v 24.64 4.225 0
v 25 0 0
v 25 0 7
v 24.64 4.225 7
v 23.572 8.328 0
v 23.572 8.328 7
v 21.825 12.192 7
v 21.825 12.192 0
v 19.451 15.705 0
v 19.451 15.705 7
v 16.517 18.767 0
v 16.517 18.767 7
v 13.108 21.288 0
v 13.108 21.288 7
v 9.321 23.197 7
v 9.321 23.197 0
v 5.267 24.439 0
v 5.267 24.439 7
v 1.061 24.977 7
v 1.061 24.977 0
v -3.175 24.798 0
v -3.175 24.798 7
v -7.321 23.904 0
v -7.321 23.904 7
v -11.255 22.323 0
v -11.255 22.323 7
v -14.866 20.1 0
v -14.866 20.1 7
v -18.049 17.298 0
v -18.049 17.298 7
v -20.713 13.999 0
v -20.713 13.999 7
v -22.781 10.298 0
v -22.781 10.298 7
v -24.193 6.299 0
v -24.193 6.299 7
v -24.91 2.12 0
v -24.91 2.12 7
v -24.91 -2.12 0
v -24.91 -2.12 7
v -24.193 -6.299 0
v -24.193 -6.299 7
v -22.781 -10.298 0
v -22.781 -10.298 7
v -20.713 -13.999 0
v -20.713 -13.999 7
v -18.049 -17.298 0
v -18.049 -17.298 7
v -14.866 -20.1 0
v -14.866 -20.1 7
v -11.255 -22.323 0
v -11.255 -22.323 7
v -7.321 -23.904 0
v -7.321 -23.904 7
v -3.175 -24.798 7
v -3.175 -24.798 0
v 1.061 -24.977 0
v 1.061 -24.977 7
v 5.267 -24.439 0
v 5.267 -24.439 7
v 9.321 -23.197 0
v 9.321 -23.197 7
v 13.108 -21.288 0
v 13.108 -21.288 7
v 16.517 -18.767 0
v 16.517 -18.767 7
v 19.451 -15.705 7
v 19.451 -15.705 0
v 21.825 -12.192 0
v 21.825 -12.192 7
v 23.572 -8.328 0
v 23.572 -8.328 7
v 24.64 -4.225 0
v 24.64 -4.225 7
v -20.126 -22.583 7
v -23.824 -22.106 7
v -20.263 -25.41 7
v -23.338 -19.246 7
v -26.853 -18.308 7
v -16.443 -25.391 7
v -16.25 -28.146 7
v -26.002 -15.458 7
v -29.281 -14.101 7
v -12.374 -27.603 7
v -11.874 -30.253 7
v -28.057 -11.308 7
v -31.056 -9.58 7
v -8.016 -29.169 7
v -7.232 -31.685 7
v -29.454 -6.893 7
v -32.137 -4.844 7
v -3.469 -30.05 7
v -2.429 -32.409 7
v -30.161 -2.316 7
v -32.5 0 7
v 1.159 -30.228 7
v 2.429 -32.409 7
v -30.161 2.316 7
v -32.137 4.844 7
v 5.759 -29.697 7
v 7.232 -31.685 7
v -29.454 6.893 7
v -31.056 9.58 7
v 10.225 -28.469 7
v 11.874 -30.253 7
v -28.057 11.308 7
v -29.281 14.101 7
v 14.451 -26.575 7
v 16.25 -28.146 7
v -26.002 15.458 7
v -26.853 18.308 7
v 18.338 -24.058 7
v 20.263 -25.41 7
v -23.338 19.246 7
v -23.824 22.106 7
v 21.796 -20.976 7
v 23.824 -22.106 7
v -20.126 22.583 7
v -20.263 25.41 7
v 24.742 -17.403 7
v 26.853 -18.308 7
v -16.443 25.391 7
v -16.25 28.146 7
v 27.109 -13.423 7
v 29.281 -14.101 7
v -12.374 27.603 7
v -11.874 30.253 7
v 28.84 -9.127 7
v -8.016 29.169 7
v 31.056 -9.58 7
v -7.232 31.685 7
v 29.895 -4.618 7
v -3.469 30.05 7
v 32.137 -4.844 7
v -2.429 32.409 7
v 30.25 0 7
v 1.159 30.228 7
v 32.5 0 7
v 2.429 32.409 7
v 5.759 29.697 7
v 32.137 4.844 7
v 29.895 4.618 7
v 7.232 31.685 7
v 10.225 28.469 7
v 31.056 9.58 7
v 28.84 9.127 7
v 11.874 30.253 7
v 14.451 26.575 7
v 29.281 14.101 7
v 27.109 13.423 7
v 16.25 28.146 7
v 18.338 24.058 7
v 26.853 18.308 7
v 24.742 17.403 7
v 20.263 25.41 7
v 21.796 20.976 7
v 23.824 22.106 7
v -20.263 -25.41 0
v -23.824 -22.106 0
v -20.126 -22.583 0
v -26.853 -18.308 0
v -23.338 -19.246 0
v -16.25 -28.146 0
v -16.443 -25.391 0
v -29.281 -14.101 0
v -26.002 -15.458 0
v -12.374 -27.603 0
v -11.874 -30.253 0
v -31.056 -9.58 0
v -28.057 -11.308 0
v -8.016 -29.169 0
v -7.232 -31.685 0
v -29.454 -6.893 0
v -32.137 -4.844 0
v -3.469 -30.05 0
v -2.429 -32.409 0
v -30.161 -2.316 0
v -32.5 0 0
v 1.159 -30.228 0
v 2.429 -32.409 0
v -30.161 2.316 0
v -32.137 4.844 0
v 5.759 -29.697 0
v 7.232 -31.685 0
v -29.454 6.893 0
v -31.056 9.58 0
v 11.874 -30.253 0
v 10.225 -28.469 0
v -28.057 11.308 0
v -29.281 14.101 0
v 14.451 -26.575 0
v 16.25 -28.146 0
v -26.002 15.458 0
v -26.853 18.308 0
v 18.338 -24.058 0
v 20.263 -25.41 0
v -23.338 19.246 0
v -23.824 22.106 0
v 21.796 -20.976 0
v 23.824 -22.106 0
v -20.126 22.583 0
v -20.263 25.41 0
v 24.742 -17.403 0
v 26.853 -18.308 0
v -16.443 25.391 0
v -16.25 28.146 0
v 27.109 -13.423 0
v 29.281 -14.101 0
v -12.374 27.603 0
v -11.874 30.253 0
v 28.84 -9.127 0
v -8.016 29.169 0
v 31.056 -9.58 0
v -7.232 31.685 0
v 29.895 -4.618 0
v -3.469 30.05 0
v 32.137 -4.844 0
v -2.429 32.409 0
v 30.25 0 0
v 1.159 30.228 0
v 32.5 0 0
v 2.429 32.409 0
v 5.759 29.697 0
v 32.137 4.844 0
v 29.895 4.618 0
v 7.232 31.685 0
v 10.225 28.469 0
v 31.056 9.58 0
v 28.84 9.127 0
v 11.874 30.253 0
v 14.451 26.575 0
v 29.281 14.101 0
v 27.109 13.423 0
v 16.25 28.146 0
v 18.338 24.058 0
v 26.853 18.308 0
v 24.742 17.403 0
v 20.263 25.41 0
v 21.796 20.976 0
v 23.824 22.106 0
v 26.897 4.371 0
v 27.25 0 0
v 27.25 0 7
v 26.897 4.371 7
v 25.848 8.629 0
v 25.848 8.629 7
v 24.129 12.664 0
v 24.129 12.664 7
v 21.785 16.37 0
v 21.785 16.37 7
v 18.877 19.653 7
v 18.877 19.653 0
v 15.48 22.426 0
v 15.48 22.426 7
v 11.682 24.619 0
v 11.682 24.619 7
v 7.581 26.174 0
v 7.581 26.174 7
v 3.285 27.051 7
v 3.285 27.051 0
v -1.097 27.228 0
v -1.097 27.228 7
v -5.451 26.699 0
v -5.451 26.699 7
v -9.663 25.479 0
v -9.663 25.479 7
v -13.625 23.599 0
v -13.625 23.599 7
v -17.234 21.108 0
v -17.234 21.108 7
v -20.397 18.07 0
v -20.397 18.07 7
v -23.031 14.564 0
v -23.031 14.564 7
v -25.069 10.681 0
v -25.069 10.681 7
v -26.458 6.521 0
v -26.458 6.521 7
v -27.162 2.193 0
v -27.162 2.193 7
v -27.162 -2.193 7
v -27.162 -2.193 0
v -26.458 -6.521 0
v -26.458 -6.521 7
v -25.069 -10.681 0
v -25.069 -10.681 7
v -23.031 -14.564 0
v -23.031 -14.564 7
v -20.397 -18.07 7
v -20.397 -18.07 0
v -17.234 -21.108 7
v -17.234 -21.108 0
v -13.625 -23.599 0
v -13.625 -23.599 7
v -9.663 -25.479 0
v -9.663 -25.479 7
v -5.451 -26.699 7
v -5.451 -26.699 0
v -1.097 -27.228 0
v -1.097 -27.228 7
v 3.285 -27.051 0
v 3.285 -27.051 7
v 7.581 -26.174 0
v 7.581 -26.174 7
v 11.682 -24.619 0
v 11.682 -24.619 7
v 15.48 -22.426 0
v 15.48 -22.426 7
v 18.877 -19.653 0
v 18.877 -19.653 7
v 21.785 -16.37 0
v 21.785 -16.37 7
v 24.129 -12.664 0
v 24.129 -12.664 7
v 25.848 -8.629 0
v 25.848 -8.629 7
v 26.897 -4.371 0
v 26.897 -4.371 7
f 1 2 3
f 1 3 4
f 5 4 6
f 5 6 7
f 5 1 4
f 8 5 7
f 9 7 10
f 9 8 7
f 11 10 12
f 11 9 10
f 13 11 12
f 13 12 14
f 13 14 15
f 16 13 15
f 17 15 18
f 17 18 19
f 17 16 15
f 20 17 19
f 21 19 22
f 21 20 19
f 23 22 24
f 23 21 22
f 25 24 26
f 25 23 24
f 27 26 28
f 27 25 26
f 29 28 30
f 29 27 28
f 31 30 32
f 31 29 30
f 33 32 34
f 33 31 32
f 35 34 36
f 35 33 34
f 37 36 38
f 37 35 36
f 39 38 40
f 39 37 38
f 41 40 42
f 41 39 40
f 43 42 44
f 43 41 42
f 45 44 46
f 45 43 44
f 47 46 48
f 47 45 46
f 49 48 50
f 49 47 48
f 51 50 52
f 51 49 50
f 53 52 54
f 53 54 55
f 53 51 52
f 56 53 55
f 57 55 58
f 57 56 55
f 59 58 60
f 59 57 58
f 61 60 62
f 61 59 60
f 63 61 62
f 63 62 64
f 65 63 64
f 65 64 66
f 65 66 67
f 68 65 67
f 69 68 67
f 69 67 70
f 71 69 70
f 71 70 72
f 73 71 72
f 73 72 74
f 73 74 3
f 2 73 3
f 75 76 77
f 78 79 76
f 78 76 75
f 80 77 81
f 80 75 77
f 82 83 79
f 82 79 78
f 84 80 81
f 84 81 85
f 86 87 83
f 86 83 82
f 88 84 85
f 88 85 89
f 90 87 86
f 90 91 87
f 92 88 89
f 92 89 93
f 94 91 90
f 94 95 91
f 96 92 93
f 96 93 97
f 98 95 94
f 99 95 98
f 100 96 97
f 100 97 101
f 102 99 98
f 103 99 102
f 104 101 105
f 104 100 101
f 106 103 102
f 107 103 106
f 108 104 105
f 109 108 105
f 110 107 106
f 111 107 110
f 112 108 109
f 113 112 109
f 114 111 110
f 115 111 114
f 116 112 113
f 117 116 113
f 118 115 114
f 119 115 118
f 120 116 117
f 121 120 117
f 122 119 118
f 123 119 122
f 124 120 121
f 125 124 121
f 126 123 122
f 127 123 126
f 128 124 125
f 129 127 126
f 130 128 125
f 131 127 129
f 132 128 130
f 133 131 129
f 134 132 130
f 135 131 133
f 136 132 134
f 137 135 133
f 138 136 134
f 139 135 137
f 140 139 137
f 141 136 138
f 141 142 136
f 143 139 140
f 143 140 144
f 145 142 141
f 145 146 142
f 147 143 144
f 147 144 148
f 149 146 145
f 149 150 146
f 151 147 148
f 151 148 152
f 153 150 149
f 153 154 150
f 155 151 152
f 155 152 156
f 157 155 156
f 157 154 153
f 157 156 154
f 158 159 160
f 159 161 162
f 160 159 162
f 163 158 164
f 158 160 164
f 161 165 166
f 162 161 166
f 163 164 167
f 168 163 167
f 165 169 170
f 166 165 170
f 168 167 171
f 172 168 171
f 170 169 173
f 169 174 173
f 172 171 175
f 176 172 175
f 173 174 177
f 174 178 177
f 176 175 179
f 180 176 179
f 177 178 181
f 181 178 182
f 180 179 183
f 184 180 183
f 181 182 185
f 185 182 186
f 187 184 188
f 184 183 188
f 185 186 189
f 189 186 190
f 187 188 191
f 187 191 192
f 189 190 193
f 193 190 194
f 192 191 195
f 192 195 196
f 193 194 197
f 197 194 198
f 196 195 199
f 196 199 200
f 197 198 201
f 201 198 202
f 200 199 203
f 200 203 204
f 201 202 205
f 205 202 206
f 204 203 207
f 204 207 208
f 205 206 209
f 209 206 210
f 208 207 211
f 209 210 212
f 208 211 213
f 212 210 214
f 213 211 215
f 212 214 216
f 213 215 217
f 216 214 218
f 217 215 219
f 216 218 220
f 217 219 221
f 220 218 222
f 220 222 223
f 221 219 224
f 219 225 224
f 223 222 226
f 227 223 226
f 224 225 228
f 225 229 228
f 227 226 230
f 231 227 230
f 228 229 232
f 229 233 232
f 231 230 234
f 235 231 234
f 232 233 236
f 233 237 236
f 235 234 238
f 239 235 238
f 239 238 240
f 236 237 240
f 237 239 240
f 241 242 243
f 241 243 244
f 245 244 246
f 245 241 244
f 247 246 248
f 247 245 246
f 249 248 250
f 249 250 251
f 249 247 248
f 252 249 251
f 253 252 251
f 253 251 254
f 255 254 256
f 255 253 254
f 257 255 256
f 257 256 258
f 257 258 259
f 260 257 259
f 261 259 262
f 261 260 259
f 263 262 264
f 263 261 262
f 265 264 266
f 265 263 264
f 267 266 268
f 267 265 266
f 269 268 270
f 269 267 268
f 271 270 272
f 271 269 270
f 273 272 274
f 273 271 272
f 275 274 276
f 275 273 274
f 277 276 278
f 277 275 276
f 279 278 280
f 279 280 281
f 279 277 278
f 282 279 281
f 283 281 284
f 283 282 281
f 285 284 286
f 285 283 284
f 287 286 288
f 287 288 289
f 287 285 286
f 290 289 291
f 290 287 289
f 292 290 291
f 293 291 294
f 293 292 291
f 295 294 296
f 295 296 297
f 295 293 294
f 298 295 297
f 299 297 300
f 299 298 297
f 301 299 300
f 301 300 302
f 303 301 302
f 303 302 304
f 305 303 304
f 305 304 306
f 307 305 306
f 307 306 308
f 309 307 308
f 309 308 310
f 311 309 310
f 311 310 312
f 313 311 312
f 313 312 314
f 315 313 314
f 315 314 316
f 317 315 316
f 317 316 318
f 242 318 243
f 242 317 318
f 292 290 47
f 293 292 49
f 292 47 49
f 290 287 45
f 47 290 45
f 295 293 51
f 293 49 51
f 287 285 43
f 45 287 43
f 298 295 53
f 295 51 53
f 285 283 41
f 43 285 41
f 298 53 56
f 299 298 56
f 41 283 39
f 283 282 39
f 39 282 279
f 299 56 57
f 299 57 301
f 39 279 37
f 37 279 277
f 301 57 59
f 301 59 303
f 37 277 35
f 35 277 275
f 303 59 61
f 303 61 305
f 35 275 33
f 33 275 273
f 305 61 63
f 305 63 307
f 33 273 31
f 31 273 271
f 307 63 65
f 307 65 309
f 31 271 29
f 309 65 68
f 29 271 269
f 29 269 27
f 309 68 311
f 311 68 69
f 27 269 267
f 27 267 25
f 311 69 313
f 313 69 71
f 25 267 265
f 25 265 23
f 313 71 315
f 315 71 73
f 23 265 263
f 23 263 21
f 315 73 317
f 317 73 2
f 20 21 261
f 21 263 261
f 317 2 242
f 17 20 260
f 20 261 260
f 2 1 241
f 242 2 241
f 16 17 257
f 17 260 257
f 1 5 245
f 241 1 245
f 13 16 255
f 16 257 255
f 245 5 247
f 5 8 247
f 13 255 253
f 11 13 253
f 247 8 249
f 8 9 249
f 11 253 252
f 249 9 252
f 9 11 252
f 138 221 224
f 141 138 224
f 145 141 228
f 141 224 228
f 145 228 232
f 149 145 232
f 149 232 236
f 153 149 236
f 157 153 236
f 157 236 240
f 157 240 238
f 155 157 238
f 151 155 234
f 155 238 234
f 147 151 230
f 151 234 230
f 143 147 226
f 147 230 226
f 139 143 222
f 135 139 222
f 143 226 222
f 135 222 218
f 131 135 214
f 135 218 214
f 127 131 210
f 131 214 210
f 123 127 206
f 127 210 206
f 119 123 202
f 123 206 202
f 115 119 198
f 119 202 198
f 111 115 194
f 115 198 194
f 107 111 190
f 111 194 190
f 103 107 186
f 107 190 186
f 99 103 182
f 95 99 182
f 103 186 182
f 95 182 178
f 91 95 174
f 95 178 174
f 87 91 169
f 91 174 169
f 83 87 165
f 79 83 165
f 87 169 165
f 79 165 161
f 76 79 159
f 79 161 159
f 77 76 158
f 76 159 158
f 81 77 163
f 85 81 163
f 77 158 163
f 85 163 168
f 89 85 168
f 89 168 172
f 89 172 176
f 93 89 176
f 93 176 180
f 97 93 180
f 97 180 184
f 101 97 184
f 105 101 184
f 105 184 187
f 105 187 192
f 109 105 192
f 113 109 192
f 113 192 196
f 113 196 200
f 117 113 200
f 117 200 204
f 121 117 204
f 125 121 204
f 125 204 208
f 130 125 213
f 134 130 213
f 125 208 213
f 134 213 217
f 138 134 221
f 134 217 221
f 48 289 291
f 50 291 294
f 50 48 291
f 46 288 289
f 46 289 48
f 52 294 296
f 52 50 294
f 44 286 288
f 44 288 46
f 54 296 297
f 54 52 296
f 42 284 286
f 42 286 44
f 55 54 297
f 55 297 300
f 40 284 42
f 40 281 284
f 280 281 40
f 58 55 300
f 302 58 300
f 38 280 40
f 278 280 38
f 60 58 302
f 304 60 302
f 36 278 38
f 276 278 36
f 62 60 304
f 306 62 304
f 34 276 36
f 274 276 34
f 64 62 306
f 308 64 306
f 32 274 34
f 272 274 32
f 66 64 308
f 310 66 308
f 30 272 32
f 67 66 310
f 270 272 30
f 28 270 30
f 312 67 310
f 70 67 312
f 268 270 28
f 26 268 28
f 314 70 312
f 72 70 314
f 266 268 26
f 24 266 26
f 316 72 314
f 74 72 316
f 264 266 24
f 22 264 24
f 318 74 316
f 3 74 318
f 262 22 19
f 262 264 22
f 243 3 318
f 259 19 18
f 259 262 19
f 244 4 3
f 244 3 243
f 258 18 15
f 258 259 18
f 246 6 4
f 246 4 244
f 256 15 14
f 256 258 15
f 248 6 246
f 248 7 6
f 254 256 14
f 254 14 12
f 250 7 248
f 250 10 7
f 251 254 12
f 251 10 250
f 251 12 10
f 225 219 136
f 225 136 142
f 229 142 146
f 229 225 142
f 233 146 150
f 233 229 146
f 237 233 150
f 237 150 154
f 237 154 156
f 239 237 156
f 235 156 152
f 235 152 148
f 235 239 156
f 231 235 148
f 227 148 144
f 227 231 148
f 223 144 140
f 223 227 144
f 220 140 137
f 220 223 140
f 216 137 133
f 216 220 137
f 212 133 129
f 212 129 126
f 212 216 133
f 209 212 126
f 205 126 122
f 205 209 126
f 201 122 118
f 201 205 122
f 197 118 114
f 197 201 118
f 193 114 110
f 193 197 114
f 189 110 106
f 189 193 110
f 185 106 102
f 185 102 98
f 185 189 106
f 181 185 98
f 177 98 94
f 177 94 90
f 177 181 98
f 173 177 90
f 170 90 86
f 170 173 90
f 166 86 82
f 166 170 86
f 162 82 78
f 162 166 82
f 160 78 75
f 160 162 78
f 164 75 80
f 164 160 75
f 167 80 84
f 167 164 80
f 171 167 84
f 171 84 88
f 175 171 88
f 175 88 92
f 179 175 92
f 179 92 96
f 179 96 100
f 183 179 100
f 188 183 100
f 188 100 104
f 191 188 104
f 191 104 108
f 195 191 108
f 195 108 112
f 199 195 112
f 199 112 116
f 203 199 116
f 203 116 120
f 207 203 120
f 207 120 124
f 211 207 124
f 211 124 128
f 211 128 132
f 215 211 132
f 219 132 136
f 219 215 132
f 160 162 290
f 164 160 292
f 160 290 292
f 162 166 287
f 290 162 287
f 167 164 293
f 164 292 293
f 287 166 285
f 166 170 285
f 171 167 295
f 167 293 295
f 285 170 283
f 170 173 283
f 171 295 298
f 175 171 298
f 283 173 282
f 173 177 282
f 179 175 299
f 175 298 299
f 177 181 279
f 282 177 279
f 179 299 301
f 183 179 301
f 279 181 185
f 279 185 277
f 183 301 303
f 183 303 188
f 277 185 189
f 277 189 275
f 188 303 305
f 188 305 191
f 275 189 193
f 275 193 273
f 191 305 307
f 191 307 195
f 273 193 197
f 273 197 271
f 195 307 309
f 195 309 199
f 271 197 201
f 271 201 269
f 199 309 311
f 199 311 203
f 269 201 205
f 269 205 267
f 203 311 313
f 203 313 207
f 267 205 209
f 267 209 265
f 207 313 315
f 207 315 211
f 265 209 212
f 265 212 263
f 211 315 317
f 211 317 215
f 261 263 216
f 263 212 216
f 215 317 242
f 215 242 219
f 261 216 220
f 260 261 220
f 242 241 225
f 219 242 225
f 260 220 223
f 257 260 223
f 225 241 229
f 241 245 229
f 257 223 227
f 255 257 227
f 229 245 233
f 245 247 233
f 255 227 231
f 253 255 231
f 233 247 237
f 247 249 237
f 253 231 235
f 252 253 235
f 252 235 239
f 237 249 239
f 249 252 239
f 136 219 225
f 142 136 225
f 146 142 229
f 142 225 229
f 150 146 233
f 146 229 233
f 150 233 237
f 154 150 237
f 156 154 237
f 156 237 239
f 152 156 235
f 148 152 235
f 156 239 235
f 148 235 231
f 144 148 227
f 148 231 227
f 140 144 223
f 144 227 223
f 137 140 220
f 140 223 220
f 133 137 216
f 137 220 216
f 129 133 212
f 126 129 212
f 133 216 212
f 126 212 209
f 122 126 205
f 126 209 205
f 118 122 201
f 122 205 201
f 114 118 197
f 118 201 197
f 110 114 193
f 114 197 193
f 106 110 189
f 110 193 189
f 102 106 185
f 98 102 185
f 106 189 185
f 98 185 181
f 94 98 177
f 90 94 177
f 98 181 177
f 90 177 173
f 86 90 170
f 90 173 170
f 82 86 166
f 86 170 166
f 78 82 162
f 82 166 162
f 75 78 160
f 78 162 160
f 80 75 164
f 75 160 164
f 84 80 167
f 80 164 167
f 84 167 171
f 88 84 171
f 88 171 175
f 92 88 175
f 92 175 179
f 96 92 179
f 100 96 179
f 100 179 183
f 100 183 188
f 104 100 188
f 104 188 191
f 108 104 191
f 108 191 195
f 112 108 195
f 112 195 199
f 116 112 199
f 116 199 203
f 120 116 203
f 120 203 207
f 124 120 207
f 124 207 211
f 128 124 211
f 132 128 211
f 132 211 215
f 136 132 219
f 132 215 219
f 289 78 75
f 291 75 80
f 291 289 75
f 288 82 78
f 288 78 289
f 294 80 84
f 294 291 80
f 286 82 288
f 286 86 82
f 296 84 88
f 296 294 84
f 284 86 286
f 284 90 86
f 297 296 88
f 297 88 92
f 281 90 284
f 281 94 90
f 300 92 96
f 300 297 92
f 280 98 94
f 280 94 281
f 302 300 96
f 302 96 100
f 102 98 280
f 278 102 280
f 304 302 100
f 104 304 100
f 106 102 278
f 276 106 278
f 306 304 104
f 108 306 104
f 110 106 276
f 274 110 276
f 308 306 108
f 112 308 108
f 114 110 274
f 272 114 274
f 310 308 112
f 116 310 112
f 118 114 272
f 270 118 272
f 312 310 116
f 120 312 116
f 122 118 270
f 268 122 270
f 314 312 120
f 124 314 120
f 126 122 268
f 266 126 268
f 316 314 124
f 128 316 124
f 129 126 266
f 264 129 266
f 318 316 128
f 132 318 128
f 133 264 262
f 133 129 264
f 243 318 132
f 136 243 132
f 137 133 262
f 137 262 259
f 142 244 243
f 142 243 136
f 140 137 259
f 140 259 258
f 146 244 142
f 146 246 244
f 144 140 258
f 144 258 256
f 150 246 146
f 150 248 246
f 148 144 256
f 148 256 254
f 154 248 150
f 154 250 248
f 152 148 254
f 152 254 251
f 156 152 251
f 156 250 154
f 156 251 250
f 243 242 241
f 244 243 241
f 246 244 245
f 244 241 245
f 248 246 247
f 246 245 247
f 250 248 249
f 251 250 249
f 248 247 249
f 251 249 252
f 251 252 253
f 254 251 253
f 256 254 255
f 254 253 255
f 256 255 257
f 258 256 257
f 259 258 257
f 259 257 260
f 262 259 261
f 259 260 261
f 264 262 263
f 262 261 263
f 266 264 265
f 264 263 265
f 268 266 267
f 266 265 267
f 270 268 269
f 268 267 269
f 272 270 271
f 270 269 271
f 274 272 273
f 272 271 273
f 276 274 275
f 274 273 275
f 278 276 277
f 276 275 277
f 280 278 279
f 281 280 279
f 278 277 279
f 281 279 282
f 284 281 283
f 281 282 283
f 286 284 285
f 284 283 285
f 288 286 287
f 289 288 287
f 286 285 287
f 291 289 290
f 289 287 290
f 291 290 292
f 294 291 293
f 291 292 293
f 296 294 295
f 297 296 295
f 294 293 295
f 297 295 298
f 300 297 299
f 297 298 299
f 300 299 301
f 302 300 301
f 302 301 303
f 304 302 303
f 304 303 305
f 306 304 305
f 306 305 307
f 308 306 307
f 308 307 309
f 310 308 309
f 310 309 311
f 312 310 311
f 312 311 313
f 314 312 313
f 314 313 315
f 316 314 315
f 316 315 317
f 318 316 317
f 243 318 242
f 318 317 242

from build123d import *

# Parameters (mm, degrees)
SKETCH1_R           = 27.25
SKETCH1_R_2         = 25
BOSS_EXTRUDE1_DEPTH = 7
SKETCH3_R           = 30.25
SKETCH3_R_2         = 27.25
BOSS_EXTRUDE4_DEPTH = 7
SKETCH5_R           = 32.5
SKETCH5_R_2         = 30.25
BOSS_EXTRUDE5_DEPTH = 7


with BuildPart() as part:
    # Sketch1 → Boss-Extrude1 (new body)
    with BuildSketch(Plane.XY):
        Circle(SKETCH1_R)
        Circle(SKETCH1_R_2, mode=Mode.SUBTRACT)
    extrude(amount=BOSS_EXTRUDE1_DEPTH)


with BuildPart() as body_2:
    # Sketch3 → Boss-Extrude4 (new body)
    with BuildSketch(Plane.XY):
        Circle(SKETCH3_R)
        Circle(SKETCH3_R_2, mode=Mode.SUBTRACT)
    extrude(amount=BOSS_EXTRUDE4_DEPTH)


with BuildPart() as body_3:
    # Sketch5 → Boss-Extrude5 (new body)
    with BuildSketch(Plane.XY):
        Circle(SKETCH5_R)
        Circle(SKETCH5_R_2, mode=Mode.SUBTRACT)
    extrude(amount=BOSS_EXTRUDE5_DEPTH)


solid = Compound([part.part, body_2.part, body_3.part])
